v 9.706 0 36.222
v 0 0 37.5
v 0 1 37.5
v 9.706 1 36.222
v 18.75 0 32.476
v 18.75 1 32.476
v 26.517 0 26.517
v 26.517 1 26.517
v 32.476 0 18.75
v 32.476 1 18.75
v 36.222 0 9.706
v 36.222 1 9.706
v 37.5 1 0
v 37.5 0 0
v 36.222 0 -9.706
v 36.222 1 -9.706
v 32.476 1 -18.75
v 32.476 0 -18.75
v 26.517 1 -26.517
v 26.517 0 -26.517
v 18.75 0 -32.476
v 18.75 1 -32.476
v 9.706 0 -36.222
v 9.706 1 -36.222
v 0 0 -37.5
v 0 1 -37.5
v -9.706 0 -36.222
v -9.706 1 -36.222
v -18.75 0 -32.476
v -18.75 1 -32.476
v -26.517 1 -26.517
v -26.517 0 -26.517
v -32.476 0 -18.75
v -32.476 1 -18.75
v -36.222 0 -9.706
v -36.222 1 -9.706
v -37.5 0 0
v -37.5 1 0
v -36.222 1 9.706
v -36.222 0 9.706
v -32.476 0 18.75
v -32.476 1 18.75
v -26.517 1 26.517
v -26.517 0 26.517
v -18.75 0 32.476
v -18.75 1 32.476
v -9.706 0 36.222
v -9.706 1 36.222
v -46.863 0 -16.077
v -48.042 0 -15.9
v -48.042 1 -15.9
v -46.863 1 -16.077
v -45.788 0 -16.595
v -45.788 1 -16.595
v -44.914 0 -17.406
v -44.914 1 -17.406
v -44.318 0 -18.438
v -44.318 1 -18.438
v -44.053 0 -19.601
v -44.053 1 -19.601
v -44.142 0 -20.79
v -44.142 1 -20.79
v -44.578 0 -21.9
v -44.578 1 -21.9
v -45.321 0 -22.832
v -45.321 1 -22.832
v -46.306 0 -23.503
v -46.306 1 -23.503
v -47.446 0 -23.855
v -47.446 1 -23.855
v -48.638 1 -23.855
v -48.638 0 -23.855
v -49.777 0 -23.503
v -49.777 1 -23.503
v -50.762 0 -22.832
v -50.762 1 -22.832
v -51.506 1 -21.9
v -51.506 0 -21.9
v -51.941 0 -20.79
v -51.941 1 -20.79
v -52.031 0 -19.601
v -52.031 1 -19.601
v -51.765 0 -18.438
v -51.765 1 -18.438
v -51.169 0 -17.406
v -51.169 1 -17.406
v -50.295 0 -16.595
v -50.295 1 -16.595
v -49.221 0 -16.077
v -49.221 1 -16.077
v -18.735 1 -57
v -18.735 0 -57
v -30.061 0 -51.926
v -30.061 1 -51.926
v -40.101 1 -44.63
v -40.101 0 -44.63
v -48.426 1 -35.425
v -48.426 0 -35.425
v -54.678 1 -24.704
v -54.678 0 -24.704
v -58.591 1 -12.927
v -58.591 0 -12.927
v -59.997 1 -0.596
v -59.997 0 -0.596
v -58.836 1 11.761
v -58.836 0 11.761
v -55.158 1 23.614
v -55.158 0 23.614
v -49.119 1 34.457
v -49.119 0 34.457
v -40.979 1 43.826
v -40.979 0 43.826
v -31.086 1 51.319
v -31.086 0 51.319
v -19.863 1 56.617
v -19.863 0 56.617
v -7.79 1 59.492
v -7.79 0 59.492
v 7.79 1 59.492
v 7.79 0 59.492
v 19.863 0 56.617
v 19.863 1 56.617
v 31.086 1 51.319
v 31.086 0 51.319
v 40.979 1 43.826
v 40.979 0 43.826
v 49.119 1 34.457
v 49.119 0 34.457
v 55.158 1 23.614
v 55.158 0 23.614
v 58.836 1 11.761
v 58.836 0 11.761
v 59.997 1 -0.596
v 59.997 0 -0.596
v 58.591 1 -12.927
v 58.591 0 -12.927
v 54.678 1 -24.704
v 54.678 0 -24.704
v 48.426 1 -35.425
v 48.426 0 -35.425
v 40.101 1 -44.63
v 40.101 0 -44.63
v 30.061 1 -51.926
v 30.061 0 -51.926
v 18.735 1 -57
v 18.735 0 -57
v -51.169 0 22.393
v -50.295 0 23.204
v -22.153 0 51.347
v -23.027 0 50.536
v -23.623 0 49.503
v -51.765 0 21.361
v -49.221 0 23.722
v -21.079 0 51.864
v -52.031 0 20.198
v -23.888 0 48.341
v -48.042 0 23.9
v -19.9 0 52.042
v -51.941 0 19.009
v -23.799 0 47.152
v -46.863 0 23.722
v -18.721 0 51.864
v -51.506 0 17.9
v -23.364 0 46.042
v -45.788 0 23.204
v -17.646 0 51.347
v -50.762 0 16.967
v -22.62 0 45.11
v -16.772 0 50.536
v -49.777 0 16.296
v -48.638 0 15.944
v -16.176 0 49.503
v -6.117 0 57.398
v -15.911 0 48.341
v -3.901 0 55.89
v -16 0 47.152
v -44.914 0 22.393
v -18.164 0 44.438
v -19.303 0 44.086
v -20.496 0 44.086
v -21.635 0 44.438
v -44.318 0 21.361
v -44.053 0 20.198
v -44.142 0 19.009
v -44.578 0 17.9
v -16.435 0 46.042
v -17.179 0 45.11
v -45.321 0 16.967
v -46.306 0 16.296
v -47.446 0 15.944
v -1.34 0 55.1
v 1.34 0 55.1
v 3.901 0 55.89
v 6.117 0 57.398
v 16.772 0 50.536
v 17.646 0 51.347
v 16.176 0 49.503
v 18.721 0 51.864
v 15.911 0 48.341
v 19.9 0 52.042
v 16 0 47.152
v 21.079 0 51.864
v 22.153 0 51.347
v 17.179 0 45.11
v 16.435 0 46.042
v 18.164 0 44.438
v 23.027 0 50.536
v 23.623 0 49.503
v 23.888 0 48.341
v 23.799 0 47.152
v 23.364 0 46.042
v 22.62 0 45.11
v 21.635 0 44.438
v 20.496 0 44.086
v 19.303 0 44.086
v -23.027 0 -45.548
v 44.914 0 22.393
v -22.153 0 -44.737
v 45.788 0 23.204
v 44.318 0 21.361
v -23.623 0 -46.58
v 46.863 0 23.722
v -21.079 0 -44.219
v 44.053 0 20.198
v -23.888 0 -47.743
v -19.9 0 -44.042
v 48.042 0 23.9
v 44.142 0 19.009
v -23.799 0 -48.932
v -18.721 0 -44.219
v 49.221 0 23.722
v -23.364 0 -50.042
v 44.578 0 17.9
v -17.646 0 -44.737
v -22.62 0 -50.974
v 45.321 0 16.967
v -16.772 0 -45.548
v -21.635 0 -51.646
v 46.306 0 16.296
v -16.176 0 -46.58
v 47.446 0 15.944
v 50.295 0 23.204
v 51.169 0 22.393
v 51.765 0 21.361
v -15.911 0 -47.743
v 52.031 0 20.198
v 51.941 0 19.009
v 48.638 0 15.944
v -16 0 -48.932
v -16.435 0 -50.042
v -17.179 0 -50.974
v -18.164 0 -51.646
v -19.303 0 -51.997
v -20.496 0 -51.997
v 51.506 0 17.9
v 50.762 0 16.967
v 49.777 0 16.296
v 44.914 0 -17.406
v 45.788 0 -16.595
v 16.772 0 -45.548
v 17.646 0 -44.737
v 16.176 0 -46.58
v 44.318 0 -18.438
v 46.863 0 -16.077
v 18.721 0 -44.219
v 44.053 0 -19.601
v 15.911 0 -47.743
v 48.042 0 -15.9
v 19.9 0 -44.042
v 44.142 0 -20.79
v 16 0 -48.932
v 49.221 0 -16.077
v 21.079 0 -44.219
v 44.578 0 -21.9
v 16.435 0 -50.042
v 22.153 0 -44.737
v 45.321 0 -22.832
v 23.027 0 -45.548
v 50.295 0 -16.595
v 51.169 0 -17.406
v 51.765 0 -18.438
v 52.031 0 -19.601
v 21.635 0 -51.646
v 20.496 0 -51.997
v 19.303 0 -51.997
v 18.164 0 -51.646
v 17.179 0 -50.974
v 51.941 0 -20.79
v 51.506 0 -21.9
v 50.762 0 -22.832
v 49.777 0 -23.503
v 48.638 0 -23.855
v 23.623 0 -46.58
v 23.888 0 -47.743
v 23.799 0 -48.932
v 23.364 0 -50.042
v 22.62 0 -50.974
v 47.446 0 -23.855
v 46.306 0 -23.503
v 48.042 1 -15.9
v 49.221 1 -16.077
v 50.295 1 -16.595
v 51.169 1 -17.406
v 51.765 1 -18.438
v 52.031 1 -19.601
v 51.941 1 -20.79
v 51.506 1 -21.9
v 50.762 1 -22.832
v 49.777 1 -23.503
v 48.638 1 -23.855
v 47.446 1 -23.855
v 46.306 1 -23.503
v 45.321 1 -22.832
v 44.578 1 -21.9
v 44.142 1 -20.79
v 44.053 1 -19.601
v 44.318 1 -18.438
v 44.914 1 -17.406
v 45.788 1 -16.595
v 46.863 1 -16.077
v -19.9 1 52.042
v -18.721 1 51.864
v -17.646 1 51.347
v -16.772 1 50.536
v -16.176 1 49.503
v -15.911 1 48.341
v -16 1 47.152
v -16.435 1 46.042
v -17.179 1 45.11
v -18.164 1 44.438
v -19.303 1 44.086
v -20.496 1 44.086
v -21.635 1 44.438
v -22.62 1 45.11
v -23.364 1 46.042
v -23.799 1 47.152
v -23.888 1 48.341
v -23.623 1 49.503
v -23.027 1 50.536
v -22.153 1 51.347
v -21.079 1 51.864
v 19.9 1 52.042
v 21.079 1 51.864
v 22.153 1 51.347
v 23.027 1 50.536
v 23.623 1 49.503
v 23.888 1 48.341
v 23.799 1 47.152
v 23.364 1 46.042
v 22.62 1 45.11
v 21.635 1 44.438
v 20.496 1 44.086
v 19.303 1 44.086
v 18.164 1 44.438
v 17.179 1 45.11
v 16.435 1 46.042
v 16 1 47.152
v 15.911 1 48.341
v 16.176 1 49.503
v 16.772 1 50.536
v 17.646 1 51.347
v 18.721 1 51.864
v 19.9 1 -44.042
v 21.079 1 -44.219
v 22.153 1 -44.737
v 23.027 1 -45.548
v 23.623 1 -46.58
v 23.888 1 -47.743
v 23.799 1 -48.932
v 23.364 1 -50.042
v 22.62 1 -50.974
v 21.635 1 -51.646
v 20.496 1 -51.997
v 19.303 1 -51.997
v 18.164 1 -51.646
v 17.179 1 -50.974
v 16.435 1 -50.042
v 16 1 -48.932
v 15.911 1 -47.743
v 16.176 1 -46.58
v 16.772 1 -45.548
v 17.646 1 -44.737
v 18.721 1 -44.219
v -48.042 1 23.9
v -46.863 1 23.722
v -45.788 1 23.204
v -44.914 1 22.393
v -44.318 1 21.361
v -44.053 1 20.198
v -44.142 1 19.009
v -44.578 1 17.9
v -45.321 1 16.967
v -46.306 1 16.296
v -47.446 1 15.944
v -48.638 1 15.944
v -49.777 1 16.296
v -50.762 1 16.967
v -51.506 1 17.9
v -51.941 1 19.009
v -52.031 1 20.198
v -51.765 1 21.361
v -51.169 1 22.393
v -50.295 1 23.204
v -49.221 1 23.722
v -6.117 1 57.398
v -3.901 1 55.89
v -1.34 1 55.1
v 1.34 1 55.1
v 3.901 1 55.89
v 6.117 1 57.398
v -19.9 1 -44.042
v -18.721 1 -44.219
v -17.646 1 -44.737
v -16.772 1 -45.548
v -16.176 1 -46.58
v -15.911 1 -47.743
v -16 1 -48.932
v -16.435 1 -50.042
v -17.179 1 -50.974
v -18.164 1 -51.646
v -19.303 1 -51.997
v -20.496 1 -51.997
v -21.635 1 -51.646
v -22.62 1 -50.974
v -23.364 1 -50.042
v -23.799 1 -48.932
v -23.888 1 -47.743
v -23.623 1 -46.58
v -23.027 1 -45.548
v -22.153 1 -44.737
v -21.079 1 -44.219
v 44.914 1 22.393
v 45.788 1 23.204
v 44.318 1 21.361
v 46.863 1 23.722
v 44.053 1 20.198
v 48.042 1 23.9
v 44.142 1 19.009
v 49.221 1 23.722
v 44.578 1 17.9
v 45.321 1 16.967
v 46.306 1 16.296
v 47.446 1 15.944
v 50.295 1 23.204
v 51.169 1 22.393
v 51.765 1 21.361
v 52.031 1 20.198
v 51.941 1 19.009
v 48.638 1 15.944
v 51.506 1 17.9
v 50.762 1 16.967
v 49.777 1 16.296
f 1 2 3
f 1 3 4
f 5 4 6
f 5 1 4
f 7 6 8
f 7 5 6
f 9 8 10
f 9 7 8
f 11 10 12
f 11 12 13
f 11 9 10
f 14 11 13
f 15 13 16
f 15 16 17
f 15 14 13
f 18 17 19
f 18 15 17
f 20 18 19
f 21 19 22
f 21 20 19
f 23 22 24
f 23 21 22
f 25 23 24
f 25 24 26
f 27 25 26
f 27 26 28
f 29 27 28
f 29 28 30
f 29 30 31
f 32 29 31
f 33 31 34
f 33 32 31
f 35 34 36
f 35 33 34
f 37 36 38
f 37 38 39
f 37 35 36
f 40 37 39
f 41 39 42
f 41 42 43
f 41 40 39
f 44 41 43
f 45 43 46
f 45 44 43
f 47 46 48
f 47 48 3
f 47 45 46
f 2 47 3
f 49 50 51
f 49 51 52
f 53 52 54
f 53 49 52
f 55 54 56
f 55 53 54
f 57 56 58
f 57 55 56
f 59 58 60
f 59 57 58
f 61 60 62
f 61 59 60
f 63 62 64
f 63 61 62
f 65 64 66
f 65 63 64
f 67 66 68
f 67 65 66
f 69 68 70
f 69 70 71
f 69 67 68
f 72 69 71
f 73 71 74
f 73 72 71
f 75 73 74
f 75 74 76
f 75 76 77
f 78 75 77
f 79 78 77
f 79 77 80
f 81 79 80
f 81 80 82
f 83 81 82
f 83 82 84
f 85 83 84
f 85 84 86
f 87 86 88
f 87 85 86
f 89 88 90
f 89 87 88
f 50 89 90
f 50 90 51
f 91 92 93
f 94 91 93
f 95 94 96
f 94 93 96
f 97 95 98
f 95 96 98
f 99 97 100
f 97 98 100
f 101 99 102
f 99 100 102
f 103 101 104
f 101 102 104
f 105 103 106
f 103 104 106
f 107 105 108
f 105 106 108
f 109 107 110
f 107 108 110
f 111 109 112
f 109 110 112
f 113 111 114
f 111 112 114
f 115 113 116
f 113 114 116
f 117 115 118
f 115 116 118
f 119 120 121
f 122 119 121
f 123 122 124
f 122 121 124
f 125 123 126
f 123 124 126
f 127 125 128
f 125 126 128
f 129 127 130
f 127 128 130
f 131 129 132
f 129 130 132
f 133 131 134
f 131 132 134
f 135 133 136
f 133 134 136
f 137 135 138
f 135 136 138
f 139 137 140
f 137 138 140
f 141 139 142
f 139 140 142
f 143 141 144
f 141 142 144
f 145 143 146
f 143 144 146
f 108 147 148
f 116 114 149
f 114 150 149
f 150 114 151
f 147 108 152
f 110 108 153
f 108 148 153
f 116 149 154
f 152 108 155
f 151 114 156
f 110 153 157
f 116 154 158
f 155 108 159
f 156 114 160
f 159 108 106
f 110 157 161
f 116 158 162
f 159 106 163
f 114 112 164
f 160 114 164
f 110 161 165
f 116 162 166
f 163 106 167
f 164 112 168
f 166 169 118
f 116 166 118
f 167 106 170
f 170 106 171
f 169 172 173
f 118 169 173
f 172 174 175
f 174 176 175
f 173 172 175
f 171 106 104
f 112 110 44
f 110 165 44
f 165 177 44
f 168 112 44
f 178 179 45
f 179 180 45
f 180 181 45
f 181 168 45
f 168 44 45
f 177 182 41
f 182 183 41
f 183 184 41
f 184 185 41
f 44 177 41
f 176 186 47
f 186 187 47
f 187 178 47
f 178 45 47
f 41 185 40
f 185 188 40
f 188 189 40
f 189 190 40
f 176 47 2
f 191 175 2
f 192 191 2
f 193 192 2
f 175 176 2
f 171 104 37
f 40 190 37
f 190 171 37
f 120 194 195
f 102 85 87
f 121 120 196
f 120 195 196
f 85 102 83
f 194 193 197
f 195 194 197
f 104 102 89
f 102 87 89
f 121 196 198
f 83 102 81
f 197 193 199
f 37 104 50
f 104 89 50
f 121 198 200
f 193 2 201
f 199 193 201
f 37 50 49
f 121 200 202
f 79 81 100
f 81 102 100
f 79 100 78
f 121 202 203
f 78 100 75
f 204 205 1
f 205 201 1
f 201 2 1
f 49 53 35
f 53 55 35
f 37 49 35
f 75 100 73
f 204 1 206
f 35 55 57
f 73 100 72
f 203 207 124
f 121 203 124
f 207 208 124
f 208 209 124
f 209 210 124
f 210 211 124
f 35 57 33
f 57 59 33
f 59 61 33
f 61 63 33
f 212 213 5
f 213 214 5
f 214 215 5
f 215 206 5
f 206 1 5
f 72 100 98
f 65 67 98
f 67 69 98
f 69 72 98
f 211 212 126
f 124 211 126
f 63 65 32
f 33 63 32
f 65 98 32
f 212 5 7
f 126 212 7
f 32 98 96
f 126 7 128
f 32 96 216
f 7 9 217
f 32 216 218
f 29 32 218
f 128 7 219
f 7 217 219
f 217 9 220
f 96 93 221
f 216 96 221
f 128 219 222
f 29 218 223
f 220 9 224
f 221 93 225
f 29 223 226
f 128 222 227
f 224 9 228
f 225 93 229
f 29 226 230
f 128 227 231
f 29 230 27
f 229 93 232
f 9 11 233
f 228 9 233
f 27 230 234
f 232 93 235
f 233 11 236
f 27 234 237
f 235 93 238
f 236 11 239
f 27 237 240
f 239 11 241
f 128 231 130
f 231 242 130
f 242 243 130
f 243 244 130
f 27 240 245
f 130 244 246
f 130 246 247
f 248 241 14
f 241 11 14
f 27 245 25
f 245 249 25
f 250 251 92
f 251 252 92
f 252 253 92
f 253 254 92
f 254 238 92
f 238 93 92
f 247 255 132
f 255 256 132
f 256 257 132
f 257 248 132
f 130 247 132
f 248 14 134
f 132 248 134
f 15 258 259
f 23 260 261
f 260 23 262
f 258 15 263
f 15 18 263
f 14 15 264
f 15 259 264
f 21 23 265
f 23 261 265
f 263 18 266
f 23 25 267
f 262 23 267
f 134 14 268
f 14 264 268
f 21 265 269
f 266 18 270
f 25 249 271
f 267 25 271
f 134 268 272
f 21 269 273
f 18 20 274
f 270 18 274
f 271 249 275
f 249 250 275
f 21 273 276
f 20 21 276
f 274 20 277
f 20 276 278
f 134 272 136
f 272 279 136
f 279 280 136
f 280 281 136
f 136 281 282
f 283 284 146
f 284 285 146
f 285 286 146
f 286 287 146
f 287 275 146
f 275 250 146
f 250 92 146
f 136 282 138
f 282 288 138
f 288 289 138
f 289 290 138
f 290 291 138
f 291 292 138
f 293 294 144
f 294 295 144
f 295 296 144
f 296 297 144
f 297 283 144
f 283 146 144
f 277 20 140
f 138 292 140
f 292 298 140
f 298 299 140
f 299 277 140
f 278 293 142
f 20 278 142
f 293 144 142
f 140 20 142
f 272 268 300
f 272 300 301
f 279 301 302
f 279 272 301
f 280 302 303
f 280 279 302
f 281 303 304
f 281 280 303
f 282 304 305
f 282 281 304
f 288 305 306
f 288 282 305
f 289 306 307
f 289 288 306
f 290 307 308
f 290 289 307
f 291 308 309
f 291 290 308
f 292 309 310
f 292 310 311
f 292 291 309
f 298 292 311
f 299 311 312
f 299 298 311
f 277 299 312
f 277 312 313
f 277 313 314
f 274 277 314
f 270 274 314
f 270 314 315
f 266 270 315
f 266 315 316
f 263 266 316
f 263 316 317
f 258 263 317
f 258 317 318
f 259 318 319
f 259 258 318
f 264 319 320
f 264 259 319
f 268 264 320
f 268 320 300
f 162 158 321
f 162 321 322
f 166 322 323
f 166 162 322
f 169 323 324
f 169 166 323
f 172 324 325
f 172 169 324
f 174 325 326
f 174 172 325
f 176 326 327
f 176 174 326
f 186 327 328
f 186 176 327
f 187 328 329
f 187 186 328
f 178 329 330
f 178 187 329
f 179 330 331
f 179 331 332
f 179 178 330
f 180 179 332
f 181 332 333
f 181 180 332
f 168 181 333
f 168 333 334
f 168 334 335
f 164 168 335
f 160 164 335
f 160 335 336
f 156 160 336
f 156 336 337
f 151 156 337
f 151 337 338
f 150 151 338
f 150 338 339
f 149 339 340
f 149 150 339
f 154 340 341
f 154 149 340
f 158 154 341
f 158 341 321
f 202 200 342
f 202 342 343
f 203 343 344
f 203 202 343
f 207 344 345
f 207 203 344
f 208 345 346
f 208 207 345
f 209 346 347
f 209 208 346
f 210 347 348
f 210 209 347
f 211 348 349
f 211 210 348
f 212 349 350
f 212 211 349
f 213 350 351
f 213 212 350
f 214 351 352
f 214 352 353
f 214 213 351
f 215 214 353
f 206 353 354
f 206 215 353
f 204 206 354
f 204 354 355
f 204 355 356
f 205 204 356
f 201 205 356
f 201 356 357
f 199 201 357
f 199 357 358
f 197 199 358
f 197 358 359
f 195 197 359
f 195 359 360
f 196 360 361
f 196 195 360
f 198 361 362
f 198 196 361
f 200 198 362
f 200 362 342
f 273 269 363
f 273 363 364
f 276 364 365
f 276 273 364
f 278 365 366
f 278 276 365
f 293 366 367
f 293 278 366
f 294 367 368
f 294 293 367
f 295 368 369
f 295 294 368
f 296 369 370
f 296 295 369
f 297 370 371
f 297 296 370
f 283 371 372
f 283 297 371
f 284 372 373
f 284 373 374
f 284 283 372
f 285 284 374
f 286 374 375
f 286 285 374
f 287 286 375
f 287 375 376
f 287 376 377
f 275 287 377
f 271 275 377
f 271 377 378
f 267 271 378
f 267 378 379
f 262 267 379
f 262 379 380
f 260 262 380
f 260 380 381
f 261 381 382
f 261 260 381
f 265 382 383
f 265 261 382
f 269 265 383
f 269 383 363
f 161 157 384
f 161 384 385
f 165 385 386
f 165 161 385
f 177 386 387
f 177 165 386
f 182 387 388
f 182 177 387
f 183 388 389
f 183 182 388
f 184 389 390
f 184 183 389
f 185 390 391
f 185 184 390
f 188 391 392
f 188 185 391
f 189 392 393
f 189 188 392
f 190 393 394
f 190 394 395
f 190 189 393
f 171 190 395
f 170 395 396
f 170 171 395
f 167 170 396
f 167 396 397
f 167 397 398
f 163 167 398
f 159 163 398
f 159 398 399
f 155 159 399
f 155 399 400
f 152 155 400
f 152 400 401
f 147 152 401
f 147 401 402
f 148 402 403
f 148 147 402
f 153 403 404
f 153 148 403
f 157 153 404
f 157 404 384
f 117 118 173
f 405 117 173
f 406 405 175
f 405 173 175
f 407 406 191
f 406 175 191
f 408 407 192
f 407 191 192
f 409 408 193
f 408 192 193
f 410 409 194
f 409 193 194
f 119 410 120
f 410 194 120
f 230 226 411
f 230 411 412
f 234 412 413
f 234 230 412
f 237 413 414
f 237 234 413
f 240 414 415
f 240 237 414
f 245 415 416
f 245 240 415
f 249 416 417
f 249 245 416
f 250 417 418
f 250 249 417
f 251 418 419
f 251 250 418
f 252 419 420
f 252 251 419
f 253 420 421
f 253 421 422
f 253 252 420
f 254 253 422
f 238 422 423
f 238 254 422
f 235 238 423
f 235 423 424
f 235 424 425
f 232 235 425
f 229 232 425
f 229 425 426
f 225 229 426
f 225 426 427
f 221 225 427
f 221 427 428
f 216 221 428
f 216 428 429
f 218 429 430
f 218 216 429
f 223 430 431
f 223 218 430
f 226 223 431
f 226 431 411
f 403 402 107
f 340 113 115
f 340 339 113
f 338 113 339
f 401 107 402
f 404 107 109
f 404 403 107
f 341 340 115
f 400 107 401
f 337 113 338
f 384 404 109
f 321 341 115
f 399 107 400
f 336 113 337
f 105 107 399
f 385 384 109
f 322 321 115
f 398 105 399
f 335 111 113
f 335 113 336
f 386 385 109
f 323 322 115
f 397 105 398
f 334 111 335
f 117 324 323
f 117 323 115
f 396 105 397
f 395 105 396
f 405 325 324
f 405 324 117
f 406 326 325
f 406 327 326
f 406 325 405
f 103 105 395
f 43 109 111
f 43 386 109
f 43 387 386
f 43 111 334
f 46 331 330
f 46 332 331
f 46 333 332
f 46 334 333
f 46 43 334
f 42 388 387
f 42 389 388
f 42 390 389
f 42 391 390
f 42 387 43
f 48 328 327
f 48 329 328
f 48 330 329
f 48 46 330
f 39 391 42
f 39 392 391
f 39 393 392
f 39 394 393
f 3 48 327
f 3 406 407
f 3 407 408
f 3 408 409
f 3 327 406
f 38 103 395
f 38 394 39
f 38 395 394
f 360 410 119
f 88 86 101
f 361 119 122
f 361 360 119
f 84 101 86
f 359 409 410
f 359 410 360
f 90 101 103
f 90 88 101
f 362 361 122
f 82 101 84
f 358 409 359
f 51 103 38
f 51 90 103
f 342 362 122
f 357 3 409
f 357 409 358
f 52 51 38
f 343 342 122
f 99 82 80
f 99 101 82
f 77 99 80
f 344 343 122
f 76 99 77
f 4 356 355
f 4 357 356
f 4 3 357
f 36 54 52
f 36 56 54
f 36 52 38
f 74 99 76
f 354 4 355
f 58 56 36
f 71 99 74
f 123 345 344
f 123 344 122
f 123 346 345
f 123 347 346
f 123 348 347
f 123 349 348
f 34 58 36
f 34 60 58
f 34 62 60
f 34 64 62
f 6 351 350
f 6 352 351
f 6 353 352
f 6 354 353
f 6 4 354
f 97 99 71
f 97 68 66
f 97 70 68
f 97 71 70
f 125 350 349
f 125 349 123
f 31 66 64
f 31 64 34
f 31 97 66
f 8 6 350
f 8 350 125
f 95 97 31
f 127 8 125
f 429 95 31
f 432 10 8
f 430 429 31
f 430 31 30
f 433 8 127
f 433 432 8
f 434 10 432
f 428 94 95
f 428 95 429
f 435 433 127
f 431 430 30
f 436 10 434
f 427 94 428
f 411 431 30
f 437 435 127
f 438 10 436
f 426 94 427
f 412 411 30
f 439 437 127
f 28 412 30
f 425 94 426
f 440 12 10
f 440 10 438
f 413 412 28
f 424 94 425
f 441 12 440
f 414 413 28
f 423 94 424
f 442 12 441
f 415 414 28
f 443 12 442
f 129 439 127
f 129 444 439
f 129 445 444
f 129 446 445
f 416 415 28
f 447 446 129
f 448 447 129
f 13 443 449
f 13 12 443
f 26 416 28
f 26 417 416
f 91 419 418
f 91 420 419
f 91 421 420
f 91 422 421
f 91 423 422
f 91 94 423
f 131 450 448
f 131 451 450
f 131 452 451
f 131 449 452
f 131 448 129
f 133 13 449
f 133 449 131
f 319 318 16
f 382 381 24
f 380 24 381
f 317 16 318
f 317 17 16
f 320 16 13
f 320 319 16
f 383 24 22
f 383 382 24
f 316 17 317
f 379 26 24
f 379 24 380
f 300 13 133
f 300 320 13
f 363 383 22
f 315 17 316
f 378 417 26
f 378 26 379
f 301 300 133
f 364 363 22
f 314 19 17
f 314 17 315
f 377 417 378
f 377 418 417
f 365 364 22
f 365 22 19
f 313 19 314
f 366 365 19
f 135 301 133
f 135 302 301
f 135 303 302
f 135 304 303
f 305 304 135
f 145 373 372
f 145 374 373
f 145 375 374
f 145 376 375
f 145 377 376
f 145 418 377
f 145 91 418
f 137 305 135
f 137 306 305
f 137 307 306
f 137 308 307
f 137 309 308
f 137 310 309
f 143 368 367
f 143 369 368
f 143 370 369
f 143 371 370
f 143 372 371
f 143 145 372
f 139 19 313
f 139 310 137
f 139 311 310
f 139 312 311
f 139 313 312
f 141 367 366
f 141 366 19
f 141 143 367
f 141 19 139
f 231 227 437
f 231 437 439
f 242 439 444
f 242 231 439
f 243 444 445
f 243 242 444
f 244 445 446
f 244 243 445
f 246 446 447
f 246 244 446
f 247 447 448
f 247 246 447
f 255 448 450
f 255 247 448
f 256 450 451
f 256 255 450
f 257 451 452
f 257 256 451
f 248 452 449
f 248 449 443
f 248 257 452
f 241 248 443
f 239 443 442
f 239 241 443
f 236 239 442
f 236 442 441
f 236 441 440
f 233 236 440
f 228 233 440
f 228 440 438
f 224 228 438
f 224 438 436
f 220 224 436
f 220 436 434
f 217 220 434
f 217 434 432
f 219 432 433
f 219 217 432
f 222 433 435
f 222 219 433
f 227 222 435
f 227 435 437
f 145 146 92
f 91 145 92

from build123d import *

# Parameters (mm, degrees)
SKETCH_1_R      = 37.5
SKETCH_1_R_2    = 4
EXTRUDE_1_DEPTH = 1


with BuildPart() as part:
    # 草图1 → 凸台-拉伸1 (new body)
    with BuildSketch(Plane(origin=(0, 0, 0), x_dir=(1, 0, 0), z_dir=(0, 1, 0))):
        with BuildLine():
            Line((18.734993995, 57), (-18.734993995, 57))
            ThreePointArc((-18.734993995, 57), (-59.736901958, -5.612712749), (-7.789712862, -59.4921875))
            ThreePointArc((-7.789712862, -59.4921875), (0, -55), (7.789712862, -59.4921875))
            ThreePointArc((7.789712862, -59.4921875), (59.736901958, -5.612712749), (18.734993995, 57))
        make_face()
        with Locations(Location((0, 0, 0), (0, 0, 270))):
            Circle(SKETCH_1_R, mode=Mode.SUBTRACT)
        with Locations(Location((-48.041735691, 19.899538483, 0), (0, 0, 270))):
            Circle(SKETCH_1_R_2, mode=Mode.SUBTRACT)
        with Locations(Location((-19.899538483, 48.041735691, 0), (0, 0, 270))):
            Circle(SKETCH_1_R_2, mode=Mode.SUBTRACT)
        with Locations(Location((19.899538483, 48.041735691, 0), (0, 0, 270))):
            Circle(SKETCH_1_R_2, mode=Mode.SUBTRACT)
        with Locations(Location((48.041735691, 19.899538483, 0), (0, 0, 270))):
            Circle(SKETCH_1_R_2, mode=Mode.SUBTRACT)
        with Locations(Location((48.041735691, -19.899538483, 0), (0, 0, 270))):
            Circle(SKETCH_1_R_2, mode=Mode.SUBTRACT)
        with Locations(Location((19.899538483, -48.041735691, 0), (0, 0, 270))):
            Circle(SKETCH_1_R_2, mode=Mode.SUBTRACT)
        with Locations(Location((-19.899538483, -48.041735691, 0), (0, 0, 270))):
            Circle(SKETCH_1_R_2, mode=Mode.SUBTRACT)
        with Locations(Location((-48.041735691, -19.899538483, 0), (0, 0, 270))):
            Circle(SKETCH_1_R_2, mode=Mode.SUBTRACT)
    extrude(amount=EXTRUDE_1_DEPTH)


solid = part.part
